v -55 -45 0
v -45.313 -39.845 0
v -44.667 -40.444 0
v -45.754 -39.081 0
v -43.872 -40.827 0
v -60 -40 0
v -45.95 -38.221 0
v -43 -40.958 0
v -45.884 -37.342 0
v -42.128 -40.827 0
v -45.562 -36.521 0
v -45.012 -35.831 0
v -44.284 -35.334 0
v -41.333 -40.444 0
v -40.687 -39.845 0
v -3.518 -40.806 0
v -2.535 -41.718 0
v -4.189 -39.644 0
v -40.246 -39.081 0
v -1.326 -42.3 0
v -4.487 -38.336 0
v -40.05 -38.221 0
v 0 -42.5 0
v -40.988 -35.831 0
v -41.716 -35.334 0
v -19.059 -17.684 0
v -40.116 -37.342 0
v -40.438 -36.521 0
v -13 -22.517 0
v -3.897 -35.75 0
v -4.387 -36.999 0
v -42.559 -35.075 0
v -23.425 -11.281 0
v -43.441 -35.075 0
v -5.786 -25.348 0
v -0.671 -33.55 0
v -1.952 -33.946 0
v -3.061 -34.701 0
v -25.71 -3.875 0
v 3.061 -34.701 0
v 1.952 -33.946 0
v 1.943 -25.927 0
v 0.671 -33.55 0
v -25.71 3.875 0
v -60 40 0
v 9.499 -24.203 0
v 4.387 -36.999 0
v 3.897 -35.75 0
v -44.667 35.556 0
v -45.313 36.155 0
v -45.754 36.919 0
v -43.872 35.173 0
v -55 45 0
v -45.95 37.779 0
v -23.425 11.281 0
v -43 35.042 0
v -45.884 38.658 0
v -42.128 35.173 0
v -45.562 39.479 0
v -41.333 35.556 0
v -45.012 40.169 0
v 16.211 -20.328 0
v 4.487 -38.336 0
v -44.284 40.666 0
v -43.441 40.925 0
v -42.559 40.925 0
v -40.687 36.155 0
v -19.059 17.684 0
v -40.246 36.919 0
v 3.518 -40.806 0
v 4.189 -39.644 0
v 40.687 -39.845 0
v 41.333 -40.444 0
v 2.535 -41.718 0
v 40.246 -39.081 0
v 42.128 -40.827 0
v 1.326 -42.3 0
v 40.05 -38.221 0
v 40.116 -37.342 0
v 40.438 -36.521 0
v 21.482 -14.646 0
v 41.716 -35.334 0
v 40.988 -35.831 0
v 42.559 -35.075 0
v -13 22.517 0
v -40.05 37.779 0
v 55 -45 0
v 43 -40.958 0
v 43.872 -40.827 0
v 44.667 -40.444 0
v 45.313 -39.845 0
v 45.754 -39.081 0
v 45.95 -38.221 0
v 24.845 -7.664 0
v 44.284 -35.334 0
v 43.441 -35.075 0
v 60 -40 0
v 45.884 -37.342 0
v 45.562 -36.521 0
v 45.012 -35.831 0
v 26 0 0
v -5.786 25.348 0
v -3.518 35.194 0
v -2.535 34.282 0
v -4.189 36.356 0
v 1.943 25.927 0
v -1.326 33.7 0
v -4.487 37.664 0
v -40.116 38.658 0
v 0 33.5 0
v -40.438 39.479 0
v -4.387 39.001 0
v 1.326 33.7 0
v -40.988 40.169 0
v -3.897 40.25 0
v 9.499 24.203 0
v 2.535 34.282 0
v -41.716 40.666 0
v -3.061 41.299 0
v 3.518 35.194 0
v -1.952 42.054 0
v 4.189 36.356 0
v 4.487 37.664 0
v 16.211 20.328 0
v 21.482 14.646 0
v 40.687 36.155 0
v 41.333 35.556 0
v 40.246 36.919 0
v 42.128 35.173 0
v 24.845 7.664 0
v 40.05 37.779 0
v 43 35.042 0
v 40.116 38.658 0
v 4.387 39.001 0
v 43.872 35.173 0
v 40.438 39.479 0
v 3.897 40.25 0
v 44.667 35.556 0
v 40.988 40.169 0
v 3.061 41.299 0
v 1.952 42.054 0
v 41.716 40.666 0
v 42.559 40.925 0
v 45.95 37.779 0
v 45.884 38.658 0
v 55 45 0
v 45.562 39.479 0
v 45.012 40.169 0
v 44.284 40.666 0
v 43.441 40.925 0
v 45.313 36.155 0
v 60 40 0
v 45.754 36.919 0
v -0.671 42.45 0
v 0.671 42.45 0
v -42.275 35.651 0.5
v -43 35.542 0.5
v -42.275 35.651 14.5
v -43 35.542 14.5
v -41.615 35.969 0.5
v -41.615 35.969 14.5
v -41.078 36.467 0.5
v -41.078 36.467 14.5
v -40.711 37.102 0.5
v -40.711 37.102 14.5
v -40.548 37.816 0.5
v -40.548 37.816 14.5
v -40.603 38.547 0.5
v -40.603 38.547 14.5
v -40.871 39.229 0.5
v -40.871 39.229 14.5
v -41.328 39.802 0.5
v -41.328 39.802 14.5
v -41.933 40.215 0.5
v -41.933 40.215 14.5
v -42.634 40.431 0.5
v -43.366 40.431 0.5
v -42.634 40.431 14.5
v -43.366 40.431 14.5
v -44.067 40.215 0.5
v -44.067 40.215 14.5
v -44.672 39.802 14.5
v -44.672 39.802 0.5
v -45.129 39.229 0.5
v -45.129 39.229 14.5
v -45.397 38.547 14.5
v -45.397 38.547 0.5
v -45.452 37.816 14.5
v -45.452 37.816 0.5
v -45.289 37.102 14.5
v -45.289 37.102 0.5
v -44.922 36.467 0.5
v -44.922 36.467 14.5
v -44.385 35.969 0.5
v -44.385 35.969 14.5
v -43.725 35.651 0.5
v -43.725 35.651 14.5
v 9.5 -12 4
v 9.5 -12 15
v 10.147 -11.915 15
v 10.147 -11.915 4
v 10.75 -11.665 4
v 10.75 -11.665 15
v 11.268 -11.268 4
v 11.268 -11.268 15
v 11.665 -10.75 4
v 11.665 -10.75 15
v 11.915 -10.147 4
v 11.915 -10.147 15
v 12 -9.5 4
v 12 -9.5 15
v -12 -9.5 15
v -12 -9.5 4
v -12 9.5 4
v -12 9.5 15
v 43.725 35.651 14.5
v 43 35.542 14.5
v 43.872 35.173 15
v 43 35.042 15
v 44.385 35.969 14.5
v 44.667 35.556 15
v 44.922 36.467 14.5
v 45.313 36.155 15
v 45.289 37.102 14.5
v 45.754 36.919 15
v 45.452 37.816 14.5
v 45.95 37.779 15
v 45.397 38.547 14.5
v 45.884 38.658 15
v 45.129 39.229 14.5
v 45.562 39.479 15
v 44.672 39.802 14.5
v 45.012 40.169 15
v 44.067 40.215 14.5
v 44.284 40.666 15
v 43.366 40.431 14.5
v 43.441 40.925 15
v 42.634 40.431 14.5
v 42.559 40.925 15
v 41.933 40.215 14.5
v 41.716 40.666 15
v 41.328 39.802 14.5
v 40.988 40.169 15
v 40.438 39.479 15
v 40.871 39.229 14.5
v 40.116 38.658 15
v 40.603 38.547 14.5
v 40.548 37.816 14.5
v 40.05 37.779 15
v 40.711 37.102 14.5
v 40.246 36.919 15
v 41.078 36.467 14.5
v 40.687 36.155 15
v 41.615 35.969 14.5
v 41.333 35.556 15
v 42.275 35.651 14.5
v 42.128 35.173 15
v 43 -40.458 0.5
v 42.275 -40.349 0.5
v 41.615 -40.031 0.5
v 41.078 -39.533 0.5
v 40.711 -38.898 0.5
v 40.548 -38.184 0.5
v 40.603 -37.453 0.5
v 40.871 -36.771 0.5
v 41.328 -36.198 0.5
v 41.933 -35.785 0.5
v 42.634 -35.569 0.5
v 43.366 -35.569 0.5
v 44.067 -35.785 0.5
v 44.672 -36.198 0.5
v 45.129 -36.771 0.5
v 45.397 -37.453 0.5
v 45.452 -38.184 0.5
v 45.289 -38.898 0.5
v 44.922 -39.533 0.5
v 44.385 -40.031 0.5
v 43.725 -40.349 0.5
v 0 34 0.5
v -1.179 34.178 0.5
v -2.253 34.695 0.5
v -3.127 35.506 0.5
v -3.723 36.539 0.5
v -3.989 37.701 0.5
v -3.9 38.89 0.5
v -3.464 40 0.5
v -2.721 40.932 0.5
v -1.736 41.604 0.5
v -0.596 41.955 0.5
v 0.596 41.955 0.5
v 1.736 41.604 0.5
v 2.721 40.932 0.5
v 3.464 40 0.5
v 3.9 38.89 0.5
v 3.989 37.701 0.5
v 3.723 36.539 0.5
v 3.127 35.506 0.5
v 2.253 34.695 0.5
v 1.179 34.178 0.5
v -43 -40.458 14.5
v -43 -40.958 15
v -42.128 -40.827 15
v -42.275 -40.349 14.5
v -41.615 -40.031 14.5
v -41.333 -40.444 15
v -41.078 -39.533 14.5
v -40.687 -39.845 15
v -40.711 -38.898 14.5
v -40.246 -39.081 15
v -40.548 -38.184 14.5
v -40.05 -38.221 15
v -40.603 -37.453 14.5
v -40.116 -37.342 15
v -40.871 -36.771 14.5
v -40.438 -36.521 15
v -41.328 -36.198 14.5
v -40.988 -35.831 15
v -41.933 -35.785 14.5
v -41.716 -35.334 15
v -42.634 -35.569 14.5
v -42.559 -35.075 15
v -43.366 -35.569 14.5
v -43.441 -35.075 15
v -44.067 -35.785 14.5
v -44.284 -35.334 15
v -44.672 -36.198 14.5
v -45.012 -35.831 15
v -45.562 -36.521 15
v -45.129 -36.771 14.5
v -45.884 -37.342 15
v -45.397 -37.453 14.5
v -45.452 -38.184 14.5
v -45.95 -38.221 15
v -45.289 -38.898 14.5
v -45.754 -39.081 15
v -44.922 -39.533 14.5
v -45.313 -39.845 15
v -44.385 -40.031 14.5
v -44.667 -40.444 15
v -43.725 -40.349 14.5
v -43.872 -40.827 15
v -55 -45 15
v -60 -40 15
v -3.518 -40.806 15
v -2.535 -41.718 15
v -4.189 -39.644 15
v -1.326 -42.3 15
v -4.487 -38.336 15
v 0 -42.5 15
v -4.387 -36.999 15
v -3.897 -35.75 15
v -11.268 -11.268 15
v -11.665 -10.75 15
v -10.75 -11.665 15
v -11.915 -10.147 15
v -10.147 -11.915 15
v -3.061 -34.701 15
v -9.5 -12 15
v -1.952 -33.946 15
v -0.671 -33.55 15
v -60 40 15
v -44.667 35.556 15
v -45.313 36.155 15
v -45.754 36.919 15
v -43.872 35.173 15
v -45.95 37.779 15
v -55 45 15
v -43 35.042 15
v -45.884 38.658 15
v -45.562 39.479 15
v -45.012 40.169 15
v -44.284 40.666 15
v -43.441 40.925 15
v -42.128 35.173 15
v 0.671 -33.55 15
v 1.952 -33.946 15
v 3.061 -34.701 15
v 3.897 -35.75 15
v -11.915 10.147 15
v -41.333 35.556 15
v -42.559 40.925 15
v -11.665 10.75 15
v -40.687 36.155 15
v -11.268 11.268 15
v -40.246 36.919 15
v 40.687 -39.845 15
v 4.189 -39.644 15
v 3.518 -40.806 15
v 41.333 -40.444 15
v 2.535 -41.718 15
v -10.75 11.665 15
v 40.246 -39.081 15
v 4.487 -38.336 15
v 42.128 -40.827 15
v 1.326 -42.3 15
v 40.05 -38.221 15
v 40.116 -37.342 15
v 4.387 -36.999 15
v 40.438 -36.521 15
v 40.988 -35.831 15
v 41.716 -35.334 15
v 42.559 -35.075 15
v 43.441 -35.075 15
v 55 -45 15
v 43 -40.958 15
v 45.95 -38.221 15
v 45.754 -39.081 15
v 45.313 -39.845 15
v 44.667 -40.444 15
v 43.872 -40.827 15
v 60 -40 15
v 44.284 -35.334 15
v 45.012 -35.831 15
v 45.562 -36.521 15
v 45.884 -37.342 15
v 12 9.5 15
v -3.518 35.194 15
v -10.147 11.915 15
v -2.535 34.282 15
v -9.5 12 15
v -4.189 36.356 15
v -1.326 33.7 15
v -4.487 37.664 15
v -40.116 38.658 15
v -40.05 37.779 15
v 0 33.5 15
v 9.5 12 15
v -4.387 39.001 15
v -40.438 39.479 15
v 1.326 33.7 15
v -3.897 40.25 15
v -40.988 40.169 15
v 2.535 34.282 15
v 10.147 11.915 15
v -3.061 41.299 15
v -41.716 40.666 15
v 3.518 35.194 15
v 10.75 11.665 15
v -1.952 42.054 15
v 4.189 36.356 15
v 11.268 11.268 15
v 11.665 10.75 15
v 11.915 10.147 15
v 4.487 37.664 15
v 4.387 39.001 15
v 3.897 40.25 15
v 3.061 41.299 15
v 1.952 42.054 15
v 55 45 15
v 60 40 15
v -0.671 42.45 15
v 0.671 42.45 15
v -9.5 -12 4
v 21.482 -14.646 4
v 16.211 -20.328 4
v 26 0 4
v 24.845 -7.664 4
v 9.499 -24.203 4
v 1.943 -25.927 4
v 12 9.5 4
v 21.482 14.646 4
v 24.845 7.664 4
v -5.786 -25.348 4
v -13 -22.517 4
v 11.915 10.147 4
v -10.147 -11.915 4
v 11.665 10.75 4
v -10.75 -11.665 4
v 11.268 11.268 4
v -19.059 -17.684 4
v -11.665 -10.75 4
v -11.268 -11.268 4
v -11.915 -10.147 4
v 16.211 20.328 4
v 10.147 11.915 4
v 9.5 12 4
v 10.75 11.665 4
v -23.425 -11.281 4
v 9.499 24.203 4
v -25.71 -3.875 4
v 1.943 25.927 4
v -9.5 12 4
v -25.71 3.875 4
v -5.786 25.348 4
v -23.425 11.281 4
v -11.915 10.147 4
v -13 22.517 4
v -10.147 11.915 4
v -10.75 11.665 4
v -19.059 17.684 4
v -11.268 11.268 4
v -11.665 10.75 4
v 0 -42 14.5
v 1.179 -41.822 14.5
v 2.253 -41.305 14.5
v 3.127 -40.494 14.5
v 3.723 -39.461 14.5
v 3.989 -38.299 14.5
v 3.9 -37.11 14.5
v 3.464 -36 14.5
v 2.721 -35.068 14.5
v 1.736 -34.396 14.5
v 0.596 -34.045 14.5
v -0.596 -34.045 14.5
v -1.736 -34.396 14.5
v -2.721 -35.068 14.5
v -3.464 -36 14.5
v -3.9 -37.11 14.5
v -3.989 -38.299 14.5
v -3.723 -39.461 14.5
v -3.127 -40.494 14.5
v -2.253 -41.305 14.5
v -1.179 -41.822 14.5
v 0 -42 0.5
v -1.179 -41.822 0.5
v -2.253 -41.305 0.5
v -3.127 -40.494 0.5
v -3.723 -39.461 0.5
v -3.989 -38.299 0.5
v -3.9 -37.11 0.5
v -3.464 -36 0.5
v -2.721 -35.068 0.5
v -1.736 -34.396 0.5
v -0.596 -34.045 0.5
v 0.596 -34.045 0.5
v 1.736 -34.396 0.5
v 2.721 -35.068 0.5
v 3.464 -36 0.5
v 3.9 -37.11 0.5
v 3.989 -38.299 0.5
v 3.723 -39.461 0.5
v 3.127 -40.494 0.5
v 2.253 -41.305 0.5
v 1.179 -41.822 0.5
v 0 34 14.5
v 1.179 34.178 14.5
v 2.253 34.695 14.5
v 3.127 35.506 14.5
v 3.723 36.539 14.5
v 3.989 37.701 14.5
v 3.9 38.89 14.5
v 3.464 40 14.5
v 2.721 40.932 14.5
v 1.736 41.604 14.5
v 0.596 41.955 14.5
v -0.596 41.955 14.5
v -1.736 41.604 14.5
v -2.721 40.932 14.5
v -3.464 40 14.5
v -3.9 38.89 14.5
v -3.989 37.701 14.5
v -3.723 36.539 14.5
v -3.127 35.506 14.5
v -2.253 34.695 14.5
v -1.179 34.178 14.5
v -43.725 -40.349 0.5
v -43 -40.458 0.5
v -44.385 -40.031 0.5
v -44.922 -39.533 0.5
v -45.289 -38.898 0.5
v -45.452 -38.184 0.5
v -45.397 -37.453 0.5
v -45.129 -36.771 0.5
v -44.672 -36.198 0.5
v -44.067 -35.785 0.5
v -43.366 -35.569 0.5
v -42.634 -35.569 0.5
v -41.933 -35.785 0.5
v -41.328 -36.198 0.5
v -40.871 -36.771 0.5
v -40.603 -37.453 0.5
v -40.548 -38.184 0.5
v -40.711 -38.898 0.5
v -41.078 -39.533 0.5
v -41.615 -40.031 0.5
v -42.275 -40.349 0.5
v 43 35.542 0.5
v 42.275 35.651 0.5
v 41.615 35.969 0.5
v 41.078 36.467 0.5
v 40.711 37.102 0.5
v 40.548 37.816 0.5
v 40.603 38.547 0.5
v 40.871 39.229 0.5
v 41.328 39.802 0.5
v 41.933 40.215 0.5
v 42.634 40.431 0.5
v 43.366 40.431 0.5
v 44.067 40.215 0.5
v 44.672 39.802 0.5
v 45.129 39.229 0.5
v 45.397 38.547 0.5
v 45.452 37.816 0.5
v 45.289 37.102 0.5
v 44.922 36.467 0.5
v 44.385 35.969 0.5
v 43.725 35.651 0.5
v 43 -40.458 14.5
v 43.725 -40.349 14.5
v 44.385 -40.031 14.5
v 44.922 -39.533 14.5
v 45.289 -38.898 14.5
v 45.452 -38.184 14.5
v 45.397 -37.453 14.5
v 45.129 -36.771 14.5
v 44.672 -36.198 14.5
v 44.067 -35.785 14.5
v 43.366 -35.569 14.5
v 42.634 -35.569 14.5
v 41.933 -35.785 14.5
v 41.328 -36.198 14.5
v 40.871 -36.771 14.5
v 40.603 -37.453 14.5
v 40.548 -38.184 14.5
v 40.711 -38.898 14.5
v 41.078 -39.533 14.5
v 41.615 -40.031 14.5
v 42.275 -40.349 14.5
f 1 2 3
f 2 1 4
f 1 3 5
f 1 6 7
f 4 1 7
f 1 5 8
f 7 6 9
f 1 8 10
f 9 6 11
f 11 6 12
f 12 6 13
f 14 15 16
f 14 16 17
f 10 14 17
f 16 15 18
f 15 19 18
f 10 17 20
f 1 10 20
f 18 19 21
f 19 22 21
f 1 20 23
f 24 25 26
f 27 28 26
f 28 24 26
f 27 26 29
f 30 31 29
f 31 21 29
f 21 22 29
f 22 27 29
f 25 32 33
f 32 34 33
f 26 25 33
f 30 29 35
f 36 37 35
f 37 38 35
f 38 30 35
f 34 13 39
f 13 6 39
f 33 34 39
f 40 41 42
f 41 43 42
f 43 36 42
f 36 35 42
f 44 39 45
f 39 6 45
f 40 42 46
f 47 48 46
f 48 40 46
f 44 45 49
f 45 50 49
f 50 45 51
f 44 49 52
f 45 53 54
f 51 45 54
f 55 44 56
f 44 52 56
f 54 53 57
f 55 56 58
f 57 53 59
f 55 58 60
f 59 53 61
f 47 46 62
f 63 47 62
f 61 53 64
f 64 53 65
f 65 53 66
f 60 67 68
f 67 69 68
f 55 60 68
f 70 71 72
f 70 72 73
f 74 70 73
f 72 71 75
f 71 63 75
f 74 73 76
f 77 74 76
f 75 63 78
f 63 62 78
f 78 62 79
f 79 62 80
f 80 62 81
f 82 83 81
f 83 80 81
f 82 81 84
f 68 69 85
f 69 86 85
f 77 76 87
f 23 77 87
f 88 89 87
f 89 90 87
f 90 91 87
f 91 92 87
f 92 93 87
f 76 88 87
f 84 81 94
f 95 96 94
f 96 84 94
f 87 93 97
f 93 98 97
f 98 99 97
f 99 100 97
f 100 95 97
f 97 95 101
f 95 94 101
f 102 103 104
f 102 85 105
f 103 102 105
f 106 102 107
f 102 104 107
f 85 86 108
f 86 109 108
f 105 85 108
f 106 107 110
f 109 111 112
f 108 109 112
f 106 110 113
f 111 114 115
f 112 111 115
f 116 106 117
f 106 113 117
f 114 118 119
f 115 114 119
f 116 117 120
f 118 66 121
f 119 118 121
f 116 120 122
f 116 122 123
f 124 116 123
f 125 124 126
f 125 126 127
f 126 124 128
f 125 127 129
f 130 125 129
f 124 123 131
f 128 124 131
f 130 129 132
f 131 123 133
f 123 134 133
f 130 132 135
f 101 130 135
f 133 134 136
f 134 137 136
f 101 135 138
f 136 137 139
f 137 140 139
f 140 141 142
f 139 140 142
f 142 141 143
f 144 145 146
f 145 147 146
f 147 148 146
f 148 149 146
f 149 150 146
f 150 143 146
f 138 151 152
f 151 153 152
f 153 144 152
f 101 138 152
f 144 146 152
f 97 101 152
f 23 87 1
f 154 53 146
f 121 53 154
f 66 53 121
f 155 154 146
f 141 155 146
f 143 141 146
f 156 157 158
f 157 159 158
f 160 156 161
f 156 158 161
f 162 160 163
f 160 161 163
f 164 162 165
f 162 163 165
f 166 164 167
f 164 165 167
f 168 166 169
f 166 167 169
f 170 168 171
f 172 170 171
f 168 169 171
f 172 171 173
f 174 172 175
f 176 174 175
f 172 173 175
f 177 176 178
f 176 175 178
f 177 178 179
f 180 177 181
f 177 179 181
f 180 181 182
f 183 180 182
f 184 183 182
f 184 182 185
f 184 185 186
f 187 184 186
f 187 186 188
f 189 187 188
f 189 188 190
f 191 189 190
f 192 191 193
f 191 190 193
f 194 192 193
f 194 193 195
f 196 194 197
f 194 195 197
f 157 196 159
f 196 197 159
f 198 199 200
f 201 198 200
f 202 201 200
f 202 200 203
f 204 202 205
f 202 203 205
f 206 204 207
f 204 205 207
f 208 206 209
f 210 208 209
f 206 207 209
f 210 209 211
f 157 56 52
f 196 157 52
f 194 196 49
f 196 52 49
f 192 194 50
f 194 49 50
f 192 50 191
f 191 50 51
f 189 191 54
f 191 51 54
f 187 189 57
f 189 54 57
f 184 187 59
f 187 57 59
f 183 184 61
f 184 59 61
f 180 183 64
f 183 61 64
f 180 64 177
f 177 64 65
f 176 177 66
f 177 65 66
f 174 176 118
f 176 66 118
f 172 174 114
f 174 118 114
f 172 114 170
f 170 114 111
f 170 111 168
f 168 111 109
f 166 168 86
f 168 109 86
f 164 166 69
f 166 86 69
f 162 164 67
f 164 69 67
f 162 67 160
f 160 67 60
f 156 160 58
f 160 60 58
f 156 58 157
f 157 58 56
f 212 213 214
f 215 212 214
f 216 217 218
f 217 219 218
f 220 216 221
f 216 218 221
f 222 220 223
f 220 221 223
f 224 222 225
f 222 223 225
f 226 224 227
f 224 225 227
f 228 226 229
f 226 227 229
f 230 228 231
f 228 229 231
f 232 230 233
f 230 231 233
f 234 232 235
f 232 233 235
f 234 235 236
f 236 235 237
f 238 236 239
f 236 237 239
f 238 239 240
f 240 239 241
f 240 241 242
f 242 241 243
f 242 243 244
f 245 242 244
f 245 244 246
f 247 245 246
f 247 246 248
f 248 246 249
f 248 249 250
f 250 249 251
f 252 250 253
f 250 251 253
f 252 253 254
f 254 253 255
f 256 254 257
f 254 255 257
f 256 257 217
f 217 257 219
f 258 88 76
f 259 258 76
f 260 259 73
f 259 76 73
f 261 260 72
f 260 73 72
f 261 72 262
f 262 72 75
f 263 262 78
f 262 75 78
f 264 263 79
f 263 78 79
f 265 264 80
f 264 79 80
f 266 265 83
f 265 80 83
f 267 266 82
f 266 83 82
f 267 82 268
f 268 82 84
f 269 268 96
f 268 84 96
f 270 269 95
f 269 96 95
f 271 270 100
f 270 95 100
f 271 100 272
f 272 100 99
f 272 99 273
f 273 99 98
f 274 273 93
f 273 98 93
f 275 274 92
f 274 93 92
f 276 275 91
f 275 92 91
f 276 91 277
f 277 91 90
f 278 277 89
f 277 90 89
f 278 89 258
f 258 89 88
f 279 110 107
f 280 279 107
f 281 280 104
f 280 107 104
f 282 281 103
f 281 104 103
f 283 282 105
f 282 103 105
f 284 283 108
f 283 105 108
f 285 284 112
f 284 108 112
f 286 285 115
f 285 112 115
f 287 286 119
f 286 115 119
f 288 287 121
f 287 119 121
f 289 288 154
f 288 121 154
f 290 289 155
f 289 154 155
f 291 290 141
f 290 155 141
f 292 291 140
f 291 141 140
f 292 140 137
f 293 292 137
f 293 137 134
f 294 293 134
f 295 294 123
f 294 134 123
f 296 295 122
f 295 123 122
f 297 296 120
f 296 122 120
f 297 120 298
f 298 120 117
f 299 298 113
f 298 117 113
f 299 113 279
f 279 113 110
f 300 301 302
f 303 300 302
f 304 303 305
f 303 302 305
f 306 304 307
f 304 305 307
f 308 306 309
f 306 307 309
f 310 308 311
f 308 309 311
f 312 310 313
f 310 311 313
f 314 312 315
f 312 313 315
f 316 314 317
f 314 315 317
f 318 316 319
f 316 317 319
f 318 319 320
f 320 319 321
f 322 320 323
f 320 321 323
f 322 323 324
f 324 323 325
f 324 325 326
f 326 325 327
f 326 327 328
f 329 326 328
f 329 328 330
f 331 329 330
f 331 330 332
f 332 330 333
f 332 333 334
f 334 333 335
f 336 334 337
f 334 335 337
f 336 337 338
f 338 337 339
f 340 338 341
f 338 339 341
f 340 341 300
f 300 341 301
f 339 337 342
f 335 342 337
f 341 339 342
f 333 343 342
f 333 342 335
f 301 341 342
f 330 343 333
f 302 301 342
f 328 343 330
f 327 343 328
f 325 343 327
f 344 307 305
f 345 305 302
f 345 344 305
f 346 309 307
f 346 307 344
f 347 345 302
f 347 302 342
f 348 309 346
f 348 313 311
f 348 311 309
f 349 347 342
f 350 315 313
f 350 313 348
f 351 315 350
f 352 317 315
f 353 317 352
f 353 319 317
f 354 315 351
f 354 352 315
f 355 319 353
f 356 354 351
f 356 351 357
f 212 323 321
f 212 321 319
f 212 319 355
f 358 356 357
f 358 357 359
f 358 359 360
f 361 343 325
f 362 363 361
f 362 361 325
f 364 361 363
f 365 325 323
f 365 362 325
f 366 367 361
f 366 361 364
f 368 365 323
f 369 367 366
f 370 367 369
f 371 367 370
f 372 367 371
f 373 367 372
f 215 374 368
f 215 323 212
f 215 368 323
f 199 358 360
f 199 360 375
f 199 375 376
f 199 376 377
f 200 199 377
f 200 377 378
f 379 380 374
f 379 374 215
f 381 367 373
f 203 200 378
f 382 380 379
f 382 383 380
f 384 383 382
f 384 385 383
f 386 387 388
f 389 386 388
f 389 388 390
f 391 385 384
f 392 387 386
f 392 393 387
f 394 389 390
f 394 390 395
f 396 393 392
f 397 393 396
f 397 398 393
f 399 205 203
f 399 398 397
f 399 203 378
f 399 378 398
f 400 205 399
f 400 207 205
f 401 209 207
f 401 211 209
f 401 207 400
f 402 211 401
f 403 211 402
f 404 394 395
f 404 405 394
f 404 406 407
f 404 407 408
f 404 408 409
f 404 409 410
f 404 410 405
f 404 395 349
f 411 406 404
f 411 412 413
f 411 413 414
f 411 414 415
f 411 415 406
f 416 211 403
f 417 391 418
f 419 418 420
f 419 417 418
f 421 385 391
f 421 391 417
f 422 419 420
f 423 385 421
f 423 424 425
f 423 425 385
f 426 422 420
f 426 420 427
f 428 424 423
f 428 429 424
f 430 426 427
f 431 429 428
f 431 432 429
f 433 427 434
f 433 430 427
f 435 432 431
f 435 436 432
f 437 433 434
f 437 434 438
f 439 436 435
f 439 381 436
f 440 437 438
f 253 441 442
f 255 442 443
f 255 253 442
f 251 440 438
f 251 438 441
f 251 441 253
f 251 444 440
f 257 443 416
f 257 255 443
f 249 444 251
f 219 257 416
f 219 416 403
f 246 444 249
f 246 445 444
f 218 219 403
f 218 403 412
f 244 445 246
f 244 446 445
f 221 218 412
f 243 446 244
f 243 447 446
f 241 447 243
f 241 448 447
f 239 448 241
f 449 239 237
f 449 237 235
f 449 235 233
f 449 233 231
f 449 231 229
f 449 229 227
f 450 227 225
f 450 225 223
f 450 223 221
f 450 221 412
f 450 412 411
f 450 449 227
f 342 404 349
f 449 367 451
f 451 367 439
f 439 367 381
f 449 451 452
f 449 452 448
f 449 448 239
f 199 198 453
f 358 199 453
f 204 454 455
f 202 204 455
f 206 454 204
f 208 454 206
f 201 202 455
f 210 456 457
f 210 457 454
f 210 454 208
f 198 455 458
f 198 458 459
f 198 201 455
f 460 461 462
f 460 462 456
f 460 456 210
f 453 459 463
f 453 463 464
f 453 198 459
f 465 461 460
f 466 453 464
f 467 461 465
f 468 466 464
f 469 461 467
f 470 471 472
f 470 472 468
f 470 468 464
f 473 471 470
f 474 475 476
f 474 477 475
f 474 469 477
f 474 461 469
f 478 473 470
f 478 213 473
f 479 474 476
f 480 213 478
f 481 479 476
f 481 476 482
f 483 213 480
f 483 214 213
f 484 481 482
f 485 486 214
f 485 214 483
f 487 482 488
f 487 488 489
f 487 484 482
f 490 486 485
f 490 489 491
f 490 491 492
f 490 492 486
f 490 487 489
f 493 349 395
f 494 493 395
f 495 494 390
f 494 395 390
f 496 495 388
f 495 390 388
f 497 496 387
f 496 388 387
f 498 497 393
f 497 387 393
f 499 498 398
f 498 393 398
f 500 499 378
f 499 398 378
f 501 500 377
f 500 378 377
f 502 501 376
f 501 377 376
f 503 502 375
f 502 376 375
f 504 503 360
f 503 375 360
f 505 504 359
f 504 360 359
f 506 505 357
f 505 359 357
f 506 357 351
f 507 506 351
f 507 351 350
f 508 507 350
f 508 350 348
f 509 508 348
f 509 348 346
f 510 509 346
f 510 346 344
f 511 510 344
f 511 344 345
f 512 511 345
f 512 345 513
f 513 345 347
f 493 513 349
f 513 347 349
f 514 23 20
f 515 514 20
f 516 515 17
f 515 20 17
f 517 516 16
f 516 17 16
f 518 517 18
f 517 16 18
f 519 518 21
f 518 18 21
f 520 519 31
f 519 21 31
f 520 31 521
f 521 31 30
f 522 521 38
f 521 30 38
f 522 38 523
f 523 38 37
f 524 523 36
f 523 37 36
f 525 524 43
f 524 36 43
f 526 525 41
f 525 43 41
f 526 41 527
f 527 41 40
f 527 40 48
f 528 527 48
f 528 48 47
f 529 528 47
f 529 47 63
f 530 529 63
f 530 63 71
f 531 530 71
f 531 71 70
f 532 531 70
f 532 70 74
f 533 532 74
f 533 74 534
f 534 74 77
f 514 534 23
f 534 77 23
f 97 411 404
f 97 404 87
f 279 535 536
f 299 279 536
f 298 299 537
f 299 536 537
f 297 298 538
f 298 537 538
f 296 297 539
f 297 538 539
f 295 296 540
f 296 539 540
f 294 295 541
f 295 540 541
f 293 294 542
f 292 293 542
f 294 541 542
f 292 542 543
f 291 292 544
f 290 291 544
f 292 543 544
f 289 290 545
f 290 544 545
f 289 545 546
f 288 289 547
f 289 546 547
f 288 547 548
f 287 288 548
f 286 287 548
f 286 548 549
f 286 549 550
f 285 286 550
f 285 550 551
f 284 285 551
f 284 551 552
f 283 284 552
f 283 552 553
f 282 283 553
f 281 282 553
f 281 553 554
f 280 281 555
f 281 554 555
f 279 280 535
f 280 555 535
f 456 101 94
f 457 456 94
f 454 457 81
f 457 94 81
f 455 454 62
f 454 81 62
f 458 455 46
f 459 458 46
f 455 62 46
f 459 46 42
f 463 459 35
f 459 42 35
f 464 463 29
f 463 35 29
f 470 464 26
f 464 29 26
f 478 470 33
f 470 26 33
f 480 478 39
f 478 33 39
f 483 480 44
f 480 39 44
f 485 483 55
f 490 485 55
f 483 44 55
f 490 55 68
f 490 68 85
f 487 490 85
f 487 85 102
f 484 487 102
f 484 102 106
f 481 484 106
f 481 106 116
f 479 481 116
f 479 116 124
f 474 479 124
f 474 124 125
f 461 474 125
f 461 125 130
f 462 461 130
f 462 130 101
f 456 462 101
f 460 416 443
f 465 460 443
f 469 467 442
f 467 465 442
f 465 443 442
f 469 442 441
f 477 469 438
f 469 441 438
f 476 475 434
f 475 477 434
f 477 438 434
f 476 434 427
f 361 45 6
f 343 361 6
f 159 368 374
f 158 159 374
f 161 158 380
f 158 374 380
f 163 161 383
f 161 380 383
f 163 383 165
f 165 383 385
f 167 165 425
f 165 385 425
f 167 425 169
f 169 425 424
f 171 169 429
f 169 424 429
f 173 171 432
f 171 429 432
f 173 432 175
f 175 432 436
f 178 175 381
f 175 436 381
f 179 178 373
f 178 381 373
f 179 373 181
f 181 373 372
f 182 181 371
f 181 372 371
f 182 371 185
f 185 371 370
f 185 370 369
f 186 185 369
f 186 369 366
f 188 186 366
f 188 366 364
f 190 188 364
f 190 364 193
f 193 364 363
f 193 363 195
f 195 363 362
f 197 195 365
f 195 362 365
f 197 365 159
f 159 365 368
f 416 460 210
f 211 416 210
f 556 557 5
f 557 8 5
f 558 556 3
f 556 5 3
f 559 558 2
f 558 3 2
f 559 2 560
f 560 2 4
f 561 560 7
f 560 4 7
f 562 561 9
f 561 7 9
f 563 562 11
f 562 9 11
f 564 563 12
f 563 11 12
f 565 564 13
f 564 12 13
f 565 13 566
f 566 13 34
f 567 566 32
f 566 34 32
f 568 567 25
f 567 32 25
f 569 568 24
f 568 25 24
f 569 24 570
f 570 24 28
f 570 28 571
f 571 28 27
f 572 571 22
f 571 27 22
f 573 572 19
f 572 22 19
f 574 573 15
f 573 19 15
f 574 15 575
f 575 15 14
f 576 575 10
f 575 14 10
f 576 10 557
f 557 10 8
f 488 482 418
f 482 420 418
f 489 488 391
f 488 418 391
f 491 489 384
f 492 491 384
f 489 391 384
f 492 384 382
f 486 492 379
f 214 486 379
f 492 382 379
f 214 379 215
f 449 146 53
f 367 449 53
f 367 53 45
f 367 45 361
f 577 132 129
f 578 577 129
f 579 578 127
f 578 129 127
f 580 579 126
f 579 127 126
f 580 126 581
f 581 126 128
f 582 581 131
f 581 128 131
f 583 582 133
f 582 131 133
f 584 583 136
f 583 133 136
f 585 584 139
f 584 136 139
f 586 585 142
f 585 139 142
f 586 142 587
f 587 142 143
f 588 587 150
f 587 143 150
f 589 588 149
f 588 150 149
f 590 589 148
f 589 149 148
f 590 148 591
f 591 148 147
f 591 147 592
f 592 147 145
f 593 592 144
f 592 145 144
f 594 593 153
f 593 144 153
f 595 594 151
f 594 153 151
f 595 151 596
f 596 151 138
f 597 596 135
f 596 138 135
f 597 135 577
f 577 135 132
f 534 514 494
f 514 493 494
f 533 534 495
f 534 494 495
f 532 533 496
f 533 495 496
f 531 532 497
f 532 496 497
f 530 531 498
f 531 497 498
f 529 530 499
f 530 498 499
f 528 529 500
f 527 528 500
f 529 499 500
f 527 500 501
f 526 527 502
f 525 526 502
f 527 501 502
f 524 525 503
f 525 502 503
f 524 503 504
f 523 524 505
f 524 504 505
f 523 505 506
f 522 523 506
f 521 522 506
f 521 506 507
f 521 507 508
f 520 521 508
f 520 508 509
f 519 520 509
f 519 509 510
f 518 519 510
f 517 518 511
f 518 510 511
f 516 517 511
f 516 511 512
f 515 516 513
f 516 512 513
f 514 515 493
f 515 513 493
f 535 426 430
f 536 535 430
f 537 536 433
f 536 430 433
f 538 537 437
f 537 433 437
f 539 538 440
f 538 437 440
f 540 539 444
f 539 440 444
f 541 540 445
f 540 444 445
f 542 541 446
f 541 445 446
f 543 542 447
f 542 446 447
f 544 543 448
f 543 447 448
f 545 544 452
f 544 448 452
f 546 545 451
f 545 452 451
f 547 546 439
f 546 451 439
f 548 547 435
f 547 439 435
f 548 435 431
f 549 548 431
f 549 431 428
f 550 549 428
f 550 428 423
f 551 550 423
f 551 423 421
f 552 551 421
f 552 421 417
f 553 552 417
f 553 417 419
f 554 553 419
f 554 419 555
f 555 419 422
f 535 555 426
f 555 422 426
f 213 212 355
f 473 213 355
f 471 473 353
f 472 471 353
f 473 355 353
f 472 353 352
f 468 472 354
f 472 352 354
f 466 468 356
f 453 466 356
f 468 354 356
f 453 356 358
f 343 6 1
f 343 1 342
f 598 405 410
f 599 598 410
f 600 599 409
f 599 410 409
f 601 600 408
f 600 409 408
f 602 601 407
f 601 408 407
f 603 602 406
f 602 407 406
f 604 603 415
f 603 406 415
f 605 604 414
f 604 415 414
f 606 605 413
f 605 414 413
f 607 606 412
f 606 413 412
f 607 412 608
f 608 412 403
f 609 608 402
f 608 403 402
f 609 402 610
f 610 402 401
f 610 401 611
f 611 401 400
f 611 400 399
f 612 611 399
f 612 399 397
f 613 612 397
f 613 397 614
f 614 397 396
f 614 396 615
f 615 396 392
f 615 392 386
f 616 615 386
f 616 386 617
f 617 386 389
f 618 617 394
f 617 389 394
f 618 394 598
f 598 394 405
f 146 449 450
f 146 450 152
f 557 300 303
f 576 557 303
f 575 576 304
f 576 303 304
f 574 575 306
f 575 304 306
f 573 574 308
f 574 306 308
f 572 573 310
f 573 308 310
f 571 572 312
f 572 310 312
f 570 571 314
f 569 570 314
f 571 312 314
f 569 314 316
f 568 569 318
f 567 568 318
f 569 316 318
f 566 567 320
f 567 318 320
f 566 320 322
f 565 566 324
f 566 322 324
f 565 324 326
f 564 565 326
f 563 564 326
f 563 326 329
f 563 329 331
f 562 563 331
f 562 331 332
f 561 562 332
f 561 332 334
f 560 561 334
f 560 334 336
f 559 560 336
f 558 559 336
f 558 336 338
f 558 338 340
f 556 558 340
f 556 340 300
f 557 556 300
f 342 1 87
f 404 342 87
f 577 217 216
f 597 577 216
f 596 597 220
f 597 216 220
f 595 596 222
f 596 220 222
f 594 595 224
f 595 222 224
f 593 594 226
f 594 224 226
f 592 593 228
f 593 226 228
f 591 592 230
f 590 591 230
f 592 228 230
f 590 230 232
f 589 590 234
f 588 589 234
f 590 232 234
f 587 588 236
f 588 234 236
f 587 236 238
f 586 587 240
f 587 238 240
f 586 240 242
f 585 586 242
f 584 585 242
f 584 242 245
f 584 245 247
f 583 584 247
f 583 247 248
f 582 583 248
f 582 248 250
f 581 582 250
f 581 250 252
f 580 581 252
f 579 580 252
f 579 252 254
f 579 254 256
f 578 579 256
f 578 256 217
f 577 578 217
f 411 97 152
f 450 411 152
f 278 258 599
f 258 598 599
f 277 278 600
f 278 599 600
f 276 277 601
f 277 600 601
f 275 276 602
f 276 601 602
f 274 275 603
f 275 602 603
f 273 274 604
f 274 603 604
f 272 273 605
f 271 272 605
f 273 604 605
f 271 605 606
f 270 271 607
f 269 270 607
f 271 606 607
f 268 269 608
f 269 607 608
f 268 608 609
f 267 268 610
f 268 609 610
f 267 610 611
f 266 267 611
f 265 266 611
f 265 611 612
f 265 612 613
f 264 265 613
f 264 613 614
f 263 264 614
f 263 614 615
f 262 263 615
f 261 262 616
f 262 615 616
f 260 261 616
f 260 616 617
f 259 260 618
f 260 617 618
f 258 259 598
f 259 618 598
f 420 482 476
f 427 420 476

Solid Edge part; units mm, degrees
sketch "Sketch1" plane through (0, 0, 0) normal (0, 0, 1) x (1, 0, 0)
  line L0 (-60, -45) -> (60, -45)
  line L1 (60, -45) -> (60, 45)
  line L2 (60, 45) -> (-60, 45)
  line L3 (-60, 45) -> (-60, -45)
extrude "Protrusion1" add sketch "Sketch1" along normal blind 15
sketch "Sketch2" plane through (0, 0, 0) normal (0, 0, -1) x (1, 0, 0)
  circle A0 centre (0, 0) radius 26
  dimension "D1" = 52
extrude "VaciadoExtruido_1" cut sketch "Sketch2" against normal blind 4
sketch "Sketch3" plane through (0, 0, 4) normal (0, 0, -1) x (1, 0, 0)
  line L0 (-12, -12) -> (12, -12)
  line L1 (12, -12) -> (12, 12)
  line L2 (12, 12) -> (-12, 12)
  line L3 (-12, 12) -> (-12, -12)
  dimension "D1" = 24
  dimension "D2" = 24
extrude "Cutout1" cut sketch "Sketch3" against normal through all
fillet "Redondeo_1" radius 2.5 4 edges at (-12, 12, 9.5) (-12, -12, 9.5) (12, -12, 9.5) (12, 12, 9.5)
chamfer "Chaflán_1" distance 5 angle 45 4 edges at (-60, 45, 7.5) (-60, -45, 7.5) (60, -45, 7.5) (60, 45, 7.5)
hole "Agujero_1" at (0, 38, 15) direction (0, 0, -1) diameter 8 end up to next start chamfer 0.5 start chamfer angle 45 end chamfer 0.5 end chamfer angle 45
hole "Hole1" at (0, -38, 15) direction (0, 0, -1) diameter 8 end up to next start chamfer 0.5 start chamfer angle 45 end chamfer 0.5 end chamfer angle 45
hole "Hole2" at (43, -38, 15) direction (0, 0, -1) diameter 4.917 end through all start chamfer 0.5 start chamfer angle 45 end chamfer 0.5 end chamfer angle 45
hole "Hole3" at (-43, -38, 15) direction (0, 0, -1) diameter 4.917 end through all start chamfer 0.5 start chamfer angle 45 end chamfer 0.5 end chamfer angle 45
hole "Hole4" at (-43, 38, 15) direction (0, 0, -1) diameter 4.917 end through all start chamfer 0.5 start chamfer angle 45 end chamfer 0.5 end chamfer angle 45
hole "Hole5" at (43, 38, 15) direction (0, 0, -1) diameter 4.917 end through all start chamfer 0.5 start chamfer angle 45 end chamfer 0.5 end chamfer angle 45
properties part number "1976-1200-001" material "Aluminio, 7075-T6"
